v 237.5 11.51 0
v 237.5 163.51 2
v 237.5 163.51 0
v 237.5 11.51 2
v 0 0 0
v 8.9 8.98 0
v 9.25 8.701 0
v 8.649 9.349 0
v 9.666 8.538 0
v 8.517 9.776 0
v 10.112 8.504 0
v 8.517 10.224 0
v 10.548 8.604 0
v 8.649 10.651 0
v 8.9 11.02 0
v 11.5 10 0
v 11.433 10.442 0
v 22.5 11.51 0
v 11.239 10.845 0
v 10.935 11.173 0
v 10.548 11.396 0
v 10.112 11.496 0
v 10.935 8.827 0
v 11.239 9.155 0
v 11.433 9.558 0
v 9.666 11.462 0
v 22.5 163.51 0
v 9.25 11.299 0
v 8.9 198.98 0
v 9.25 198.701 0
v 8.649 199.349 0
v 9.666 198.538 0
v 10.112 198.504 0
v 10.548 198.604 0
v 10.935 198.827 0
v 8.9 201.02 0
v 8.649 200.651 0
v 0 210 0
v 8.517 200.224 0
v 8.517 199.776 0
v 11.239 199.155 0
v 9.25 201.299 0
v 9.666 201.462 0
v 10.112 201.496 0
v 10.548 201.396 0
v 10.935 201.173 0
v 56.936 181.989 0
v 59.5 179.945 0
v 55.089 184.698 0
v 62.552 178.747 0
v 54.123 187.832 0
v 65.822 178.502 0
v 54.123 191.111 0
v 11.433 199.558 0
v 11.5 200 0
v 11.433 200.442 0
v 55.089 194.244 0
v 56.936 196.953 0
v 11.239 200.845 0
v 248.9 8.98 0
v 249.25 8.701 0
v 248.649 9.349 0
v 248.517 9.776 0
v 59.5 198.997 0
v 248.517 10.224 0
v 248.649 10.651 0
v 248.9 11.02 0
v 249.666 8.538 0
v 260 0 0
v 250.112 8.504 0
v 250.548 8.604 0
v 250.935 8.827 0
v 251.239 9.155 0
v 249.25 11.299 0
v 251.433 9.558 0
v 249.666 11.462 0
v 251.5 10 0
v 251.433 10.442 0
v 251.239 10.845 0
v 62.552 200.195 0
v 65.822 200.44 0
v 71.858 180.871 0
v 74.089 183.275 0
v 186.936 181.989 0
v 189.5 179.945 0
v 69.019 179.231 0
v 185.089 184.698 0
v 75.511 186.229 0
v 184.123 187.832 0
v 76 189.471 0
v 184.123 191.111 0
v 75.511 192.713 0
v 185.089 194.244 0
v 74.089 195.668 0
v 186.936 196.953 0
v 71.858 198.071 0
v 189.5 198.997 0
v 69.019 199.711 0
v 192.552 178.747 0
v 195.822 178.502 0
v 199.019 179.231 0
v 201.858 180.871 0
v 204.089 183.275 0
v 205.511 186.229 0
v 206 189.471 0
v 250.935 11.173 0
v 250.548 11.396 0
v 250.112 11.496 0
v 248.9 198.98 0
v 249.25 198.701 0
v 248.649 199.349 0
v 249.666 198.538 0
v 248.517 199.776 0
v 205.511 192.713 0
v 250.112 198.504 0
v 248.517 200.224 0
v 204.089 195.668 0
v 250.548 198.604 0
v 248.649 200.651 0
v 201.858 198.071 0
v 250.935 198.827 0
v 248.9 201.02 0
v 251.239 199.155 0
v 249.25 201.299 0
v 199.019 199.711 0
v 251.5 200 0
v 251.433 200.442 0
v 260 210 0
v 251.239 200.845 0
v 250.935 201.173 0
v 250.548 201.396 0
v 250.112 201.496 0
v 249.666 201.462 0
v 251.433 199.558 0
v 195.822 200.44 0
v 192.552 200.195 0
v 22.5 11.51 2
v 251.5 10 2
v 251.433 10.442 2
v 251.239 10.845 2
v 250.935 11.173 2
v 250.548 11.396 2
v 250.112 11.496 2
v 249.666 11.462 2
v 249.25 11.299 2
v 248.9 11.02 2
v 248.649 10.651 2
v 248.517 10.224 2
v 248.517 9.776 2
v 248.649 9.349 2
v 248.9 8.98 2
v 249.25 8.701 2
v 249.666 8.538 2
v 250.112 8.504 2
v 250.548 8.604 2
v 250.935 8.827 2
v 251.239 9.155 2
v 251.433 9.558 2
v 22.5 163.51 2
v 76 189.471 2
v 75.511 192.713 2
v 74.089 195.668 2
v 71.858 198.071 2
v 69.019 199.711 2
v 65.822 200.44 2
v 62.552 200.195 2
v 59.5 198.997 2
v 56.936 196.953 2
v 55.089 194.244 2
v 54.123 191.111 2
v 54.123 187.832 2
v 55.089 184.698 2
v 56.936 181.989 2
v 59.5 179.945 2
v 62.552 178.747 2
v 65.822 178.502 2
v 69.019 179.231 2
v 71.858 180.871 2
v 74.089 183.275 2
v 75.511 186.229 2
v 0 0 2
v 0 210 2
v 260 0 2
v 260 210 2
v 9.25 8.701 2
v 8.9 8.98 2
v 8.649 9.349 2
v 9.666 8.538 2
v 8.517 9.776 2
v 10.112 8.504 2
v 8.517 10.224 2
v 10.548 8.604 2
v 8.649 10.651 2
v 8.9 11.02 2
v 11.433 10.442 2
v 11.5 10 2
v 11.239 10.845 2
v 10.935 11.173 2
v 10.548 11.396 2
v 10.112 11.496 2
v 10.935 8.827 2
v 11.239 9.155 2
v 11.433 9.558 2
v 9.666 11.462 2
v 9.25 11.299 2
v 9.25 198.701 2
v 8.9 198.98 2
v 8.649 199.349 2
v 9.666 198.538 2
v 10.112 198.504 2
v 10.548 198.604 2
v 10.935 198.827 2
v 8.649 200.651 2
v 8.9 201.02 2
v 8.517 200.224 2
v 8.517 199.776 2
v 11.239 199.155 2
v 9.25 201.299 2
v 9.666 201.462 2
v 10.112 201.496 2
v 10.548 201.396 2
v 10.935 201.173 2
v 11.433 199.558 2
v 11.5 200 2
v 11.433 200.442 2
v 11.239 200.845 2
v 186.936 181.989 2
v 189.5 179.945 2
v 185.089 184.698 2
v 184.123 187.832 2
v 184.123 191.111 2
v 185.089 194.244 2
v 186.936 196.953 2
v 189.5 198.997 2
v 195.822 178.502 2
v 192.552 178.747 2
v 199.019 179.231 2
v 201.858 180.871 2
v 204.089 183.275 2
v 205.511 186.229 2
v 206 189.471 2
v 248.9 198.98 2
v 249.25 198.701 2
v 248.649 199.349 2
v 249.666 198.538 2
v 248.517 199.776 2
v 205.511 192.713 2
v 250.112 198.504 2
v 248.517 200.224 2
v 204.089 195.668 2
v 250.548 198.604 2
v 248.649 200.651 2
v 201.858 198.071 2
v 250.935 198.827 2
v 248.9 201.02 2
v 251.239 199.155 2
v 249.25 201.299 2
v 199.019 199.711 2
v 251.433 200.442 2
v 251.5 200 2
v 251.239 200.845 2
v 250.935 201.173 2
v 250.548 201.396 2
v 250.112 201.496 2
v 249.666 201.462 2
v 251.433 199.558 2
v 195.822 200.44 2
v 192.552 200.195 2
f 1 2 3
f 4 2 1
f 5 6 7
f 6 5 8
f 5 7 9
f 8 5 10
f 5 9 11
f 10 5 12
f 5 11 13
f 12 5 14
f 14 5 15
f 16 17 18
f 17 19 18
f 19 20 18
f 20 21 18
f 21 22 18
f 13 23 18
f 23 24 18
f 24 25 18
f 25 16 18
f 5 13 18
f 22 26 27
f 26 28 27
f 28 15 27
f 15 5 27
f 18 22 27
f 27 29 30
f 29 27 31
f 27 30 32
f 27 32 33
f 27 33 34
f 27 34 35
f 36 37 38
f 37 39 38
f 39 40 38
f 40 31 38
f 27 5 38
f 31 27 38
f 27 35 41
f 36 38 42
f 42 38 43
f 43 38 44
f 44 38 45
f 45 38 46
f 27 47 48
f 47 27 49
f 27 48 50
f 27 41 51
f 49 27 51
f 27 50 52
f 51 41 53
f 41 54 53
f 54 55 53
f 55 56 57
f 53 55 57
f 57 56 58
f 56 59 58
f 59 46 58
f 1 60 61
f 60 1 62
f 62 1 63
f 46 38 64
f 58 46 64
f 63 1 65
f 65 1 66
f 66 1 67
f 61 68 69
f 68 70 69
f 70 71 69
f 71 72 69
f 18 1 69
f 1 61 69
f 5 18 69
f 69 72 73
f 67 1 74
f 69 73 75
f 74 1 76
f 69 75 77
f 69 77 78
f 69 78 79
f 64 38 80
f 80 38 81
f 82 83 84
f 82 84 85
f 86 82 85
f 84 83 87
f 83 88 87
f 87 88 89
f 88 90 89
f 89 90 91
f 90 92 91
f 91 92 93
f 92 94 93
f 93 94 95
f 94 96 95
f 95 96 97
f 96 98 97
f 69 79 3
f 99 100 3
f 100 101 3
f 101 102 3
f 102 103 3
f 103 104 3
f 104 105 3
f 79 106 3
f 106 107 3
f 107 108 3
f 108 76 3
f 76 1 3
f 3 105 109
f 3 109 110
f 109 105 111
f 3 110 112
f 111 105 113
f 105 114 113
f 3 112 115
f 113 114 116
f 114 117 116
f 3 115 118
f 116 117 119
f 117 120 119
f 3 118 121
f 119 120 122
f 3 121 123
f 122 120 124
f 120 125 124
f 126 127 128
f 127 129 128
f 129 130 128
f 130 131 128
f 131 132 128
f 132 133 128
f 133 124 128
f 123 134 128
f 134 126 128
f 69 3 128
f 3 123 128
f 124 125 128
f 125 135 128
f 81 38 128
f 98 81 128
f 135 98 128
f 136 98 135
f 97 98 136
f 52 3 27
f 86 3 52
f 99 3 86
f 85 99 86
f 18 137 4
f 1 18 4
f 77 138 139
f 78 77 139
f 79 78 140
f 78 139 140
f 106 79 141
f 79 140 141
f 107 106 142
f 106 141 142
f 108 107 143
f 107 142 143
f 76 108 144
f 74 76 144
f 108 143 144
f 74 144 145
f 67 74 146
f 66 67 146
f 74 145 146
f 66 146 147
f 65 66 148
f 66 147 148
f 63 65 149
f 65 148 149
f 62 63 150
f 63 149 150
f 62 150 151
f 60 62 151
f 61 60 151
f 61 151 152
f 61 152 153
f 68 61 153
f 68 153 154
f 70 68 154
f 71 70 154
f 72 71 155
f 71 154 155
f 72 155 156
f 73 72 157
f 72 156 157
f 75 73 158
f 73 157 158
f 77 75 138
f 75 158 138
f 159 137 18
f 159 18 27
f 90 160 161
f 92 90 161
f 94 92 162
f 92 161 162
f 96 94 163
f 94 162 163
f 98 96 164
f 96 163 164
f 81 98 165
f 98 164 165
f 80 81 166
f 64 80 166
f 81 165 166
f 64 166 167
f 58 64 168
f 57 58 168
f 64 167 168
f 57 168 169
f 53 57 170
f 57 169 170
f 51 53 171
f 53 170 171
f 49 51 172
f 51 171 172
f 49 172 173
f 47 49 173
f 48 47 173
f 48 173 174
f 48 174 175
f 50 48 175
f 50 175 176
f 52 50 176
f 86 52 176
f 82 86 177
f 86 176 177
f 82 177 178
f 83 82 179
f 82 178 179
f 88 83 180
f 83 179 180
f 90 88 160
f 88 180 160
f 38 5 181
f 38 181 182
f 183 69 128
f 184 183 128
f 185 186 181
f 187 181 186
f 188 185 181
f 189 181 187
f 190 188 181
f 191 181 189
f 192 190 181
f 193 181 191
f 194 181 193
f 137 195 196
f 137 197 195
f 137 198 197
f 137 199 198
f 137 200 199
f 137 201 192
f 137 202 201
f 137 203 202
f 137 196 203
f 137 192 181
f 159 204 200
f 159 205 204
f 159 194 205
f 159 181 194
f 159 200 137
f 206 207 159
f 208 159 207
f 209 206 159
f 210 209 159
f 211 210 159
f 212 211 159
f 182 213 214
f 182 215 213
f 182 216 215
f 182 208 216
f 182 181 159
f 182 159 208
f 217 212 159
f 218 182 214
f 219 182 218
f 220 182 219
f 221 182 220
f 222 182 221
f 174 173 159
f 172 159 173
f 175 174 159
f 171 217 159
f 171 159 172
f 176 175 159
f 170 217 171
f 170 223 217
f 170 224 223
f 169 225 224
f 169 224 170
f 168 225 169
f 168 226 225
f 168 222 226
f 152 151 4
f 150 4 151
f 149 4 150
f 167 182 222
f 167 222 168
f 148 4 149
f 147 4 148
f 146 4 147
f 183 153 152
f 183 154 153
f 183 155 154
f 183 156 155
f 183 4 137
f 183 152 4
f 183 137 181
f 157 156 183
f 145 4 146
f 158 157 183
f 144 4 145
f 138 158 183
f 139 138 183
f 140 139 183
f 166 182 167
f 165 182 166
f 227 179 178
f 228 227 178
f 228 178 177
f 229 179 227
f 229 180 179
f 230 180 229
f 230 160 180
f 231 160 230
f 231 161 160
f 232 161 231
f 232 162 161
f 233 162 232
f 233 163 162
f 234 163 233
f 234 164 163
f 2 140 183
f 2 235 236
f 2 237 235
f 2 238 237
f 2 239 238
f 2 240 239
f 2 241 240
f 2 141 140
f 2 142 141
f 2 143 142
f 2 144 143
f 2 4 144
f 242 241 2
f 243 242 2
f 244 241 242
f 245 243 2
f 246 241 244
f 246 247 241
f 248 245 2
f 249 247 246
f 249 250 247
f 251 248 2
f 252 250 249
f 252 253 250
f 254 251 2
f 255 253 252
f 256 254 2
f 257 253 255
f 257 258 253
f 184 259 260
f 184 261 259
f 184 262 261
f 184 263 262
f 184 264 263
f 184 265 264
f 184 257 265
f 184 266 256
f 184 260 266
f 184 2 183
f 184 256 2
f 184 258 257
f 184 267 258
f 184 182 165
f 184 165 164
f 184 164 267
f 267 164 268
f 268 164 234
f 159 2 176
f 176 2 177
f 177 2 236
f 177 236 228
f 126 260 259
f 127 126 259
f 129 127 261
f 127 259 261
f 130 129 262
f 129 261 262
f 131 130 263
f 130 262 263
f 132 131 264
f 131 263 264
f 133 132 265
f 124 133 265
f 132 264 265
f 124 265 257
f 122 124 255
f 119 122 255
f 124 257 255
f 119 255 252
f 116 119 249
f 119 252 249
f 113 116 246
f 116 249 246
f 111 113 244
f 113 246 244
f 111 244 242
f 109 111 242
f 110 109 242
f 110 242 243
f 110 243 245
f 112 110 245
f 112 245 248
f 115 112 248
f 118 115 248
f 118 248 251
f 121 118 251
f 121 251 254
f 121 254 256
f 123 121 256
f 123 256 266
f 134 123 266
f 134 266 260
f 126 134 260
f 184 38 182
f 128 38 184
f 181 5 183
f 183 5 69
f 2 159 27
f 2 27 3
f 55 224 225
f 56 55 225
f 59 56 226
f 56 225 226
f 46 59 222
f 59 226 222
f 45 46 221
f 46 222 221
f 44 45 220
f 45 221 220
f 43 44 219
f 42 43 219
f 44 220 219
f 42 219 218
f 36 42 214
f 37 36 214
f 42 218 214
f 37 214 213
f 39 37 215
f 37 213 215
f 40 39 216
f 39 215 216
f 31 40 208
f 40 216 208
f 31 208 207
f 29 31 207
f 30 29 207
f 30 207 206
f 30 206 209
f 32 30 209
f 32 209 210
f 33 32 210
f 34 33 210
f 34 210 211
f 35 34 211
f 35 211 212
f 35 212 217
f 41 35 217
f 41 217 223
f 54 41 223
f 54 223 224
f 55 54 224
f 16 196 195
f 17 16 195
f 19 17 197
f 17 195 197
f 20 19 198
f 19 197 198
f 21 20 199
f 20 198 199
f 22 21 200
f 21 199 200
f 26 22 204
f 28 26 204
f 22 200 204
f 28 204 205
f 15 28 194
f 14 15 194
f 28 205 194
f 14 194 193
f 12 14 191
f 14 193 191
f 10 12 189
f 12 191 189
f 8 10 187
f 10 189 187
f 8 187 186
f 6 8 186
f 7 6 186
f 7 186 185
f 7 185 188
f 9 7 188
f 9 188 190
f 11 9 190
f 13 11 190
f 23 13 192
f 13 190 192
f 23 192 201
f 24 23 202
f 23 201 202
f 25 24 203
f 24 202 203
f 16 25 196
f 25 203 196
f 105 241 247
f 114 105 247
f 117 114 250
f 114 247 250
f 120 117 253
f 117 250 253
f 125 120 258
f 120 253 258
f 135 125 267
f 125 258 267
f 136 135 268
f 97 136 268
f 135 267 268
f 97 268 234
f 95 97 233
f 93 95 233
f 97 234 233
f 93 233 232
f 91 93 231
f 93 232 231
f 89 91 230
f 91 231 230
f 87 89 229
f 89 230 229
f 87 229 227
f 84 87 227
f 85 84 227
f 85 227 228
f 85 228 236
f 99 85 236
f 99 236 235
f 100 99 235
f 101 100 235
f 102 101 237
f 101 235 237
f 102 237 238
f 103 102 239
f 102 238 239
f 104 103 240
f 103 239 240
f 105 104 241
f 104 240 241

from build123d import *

# Parameters (mm, degrees)
SKETCH_1_W          = 260
SKETCH_1_H          = 210
EXTRUDE_1_DEPTH     = 2
SKETCH_2_R          = 11
CUT_EXTRUDE_1_DEPTH = 2
SKETCH_3_R          = 1.5
CUT_EXTRUDE_2_DEPTH = 2
SKETCH_4_R          = 1.5
CUT_EXTRUDE_3_DEPTH = 10


with BuildPart() as part:
    # 草图1 → 凸台-拉伸1 (new body)
    with BuildSketch(Plane.XY):
        with Locations((130, 105)):
            Rectangle(SKETCH_1_W, SKETCH_1_H)
    extrude(amount=EXTRUDE_1_DEPTH)

    # 草图2 → 切除-拉伸1 (cut)
    with BuildSketch(Plane.XY.offset(2)):
        with Locations((65, 189.471035353)):
            Circle(SKETCH_2_R)
        with Locations((195, 189.471035353)):
            Circle(SKETCH_2_R)
        Polygon((130, 11.510265982), (22.5, 11.510265982), (22.5, 163.510265982), (237.5, 163.510265982), (237.5, 11.510265982), align=None)
    extrude(amount=-CUT_EXTRUDE_1_DEPTH, mode=Mode.SUBTRACT)

    # 草图3 → 切除-拉伸2 (cut)
    with BuildSketch(Plane.XY.offset(2)):
        with Locations((250, 230)):
            Circle(SKETCH_3_R)
        with Locations((10, 10)):
            Circle(SKETCH_3_R)
        with Locations((250, 10)):
            Circle(SKETCH_3_R)
        with Locations((10, 230)):
            Circle(SKETCH_3_R)
    extrude(amount=-CUT_EXTRUDE_2_DEPTH, mode=Mode.SUBTRACT)

    # 草图4 → 切除-拉伸3 (cut)
    with BuildSketch(Plane.XY.offset(2)):
        with Locations((10, 200)):
            Circle(SKETCH_4_R)
        with Locations((250, 200)):
            Circle(SKETCH_4_R)
    extrude(amount=-CUT_EXTRUDE_3_DEPTH, mode=Mode.SUBTRACT)


solid = part.part
